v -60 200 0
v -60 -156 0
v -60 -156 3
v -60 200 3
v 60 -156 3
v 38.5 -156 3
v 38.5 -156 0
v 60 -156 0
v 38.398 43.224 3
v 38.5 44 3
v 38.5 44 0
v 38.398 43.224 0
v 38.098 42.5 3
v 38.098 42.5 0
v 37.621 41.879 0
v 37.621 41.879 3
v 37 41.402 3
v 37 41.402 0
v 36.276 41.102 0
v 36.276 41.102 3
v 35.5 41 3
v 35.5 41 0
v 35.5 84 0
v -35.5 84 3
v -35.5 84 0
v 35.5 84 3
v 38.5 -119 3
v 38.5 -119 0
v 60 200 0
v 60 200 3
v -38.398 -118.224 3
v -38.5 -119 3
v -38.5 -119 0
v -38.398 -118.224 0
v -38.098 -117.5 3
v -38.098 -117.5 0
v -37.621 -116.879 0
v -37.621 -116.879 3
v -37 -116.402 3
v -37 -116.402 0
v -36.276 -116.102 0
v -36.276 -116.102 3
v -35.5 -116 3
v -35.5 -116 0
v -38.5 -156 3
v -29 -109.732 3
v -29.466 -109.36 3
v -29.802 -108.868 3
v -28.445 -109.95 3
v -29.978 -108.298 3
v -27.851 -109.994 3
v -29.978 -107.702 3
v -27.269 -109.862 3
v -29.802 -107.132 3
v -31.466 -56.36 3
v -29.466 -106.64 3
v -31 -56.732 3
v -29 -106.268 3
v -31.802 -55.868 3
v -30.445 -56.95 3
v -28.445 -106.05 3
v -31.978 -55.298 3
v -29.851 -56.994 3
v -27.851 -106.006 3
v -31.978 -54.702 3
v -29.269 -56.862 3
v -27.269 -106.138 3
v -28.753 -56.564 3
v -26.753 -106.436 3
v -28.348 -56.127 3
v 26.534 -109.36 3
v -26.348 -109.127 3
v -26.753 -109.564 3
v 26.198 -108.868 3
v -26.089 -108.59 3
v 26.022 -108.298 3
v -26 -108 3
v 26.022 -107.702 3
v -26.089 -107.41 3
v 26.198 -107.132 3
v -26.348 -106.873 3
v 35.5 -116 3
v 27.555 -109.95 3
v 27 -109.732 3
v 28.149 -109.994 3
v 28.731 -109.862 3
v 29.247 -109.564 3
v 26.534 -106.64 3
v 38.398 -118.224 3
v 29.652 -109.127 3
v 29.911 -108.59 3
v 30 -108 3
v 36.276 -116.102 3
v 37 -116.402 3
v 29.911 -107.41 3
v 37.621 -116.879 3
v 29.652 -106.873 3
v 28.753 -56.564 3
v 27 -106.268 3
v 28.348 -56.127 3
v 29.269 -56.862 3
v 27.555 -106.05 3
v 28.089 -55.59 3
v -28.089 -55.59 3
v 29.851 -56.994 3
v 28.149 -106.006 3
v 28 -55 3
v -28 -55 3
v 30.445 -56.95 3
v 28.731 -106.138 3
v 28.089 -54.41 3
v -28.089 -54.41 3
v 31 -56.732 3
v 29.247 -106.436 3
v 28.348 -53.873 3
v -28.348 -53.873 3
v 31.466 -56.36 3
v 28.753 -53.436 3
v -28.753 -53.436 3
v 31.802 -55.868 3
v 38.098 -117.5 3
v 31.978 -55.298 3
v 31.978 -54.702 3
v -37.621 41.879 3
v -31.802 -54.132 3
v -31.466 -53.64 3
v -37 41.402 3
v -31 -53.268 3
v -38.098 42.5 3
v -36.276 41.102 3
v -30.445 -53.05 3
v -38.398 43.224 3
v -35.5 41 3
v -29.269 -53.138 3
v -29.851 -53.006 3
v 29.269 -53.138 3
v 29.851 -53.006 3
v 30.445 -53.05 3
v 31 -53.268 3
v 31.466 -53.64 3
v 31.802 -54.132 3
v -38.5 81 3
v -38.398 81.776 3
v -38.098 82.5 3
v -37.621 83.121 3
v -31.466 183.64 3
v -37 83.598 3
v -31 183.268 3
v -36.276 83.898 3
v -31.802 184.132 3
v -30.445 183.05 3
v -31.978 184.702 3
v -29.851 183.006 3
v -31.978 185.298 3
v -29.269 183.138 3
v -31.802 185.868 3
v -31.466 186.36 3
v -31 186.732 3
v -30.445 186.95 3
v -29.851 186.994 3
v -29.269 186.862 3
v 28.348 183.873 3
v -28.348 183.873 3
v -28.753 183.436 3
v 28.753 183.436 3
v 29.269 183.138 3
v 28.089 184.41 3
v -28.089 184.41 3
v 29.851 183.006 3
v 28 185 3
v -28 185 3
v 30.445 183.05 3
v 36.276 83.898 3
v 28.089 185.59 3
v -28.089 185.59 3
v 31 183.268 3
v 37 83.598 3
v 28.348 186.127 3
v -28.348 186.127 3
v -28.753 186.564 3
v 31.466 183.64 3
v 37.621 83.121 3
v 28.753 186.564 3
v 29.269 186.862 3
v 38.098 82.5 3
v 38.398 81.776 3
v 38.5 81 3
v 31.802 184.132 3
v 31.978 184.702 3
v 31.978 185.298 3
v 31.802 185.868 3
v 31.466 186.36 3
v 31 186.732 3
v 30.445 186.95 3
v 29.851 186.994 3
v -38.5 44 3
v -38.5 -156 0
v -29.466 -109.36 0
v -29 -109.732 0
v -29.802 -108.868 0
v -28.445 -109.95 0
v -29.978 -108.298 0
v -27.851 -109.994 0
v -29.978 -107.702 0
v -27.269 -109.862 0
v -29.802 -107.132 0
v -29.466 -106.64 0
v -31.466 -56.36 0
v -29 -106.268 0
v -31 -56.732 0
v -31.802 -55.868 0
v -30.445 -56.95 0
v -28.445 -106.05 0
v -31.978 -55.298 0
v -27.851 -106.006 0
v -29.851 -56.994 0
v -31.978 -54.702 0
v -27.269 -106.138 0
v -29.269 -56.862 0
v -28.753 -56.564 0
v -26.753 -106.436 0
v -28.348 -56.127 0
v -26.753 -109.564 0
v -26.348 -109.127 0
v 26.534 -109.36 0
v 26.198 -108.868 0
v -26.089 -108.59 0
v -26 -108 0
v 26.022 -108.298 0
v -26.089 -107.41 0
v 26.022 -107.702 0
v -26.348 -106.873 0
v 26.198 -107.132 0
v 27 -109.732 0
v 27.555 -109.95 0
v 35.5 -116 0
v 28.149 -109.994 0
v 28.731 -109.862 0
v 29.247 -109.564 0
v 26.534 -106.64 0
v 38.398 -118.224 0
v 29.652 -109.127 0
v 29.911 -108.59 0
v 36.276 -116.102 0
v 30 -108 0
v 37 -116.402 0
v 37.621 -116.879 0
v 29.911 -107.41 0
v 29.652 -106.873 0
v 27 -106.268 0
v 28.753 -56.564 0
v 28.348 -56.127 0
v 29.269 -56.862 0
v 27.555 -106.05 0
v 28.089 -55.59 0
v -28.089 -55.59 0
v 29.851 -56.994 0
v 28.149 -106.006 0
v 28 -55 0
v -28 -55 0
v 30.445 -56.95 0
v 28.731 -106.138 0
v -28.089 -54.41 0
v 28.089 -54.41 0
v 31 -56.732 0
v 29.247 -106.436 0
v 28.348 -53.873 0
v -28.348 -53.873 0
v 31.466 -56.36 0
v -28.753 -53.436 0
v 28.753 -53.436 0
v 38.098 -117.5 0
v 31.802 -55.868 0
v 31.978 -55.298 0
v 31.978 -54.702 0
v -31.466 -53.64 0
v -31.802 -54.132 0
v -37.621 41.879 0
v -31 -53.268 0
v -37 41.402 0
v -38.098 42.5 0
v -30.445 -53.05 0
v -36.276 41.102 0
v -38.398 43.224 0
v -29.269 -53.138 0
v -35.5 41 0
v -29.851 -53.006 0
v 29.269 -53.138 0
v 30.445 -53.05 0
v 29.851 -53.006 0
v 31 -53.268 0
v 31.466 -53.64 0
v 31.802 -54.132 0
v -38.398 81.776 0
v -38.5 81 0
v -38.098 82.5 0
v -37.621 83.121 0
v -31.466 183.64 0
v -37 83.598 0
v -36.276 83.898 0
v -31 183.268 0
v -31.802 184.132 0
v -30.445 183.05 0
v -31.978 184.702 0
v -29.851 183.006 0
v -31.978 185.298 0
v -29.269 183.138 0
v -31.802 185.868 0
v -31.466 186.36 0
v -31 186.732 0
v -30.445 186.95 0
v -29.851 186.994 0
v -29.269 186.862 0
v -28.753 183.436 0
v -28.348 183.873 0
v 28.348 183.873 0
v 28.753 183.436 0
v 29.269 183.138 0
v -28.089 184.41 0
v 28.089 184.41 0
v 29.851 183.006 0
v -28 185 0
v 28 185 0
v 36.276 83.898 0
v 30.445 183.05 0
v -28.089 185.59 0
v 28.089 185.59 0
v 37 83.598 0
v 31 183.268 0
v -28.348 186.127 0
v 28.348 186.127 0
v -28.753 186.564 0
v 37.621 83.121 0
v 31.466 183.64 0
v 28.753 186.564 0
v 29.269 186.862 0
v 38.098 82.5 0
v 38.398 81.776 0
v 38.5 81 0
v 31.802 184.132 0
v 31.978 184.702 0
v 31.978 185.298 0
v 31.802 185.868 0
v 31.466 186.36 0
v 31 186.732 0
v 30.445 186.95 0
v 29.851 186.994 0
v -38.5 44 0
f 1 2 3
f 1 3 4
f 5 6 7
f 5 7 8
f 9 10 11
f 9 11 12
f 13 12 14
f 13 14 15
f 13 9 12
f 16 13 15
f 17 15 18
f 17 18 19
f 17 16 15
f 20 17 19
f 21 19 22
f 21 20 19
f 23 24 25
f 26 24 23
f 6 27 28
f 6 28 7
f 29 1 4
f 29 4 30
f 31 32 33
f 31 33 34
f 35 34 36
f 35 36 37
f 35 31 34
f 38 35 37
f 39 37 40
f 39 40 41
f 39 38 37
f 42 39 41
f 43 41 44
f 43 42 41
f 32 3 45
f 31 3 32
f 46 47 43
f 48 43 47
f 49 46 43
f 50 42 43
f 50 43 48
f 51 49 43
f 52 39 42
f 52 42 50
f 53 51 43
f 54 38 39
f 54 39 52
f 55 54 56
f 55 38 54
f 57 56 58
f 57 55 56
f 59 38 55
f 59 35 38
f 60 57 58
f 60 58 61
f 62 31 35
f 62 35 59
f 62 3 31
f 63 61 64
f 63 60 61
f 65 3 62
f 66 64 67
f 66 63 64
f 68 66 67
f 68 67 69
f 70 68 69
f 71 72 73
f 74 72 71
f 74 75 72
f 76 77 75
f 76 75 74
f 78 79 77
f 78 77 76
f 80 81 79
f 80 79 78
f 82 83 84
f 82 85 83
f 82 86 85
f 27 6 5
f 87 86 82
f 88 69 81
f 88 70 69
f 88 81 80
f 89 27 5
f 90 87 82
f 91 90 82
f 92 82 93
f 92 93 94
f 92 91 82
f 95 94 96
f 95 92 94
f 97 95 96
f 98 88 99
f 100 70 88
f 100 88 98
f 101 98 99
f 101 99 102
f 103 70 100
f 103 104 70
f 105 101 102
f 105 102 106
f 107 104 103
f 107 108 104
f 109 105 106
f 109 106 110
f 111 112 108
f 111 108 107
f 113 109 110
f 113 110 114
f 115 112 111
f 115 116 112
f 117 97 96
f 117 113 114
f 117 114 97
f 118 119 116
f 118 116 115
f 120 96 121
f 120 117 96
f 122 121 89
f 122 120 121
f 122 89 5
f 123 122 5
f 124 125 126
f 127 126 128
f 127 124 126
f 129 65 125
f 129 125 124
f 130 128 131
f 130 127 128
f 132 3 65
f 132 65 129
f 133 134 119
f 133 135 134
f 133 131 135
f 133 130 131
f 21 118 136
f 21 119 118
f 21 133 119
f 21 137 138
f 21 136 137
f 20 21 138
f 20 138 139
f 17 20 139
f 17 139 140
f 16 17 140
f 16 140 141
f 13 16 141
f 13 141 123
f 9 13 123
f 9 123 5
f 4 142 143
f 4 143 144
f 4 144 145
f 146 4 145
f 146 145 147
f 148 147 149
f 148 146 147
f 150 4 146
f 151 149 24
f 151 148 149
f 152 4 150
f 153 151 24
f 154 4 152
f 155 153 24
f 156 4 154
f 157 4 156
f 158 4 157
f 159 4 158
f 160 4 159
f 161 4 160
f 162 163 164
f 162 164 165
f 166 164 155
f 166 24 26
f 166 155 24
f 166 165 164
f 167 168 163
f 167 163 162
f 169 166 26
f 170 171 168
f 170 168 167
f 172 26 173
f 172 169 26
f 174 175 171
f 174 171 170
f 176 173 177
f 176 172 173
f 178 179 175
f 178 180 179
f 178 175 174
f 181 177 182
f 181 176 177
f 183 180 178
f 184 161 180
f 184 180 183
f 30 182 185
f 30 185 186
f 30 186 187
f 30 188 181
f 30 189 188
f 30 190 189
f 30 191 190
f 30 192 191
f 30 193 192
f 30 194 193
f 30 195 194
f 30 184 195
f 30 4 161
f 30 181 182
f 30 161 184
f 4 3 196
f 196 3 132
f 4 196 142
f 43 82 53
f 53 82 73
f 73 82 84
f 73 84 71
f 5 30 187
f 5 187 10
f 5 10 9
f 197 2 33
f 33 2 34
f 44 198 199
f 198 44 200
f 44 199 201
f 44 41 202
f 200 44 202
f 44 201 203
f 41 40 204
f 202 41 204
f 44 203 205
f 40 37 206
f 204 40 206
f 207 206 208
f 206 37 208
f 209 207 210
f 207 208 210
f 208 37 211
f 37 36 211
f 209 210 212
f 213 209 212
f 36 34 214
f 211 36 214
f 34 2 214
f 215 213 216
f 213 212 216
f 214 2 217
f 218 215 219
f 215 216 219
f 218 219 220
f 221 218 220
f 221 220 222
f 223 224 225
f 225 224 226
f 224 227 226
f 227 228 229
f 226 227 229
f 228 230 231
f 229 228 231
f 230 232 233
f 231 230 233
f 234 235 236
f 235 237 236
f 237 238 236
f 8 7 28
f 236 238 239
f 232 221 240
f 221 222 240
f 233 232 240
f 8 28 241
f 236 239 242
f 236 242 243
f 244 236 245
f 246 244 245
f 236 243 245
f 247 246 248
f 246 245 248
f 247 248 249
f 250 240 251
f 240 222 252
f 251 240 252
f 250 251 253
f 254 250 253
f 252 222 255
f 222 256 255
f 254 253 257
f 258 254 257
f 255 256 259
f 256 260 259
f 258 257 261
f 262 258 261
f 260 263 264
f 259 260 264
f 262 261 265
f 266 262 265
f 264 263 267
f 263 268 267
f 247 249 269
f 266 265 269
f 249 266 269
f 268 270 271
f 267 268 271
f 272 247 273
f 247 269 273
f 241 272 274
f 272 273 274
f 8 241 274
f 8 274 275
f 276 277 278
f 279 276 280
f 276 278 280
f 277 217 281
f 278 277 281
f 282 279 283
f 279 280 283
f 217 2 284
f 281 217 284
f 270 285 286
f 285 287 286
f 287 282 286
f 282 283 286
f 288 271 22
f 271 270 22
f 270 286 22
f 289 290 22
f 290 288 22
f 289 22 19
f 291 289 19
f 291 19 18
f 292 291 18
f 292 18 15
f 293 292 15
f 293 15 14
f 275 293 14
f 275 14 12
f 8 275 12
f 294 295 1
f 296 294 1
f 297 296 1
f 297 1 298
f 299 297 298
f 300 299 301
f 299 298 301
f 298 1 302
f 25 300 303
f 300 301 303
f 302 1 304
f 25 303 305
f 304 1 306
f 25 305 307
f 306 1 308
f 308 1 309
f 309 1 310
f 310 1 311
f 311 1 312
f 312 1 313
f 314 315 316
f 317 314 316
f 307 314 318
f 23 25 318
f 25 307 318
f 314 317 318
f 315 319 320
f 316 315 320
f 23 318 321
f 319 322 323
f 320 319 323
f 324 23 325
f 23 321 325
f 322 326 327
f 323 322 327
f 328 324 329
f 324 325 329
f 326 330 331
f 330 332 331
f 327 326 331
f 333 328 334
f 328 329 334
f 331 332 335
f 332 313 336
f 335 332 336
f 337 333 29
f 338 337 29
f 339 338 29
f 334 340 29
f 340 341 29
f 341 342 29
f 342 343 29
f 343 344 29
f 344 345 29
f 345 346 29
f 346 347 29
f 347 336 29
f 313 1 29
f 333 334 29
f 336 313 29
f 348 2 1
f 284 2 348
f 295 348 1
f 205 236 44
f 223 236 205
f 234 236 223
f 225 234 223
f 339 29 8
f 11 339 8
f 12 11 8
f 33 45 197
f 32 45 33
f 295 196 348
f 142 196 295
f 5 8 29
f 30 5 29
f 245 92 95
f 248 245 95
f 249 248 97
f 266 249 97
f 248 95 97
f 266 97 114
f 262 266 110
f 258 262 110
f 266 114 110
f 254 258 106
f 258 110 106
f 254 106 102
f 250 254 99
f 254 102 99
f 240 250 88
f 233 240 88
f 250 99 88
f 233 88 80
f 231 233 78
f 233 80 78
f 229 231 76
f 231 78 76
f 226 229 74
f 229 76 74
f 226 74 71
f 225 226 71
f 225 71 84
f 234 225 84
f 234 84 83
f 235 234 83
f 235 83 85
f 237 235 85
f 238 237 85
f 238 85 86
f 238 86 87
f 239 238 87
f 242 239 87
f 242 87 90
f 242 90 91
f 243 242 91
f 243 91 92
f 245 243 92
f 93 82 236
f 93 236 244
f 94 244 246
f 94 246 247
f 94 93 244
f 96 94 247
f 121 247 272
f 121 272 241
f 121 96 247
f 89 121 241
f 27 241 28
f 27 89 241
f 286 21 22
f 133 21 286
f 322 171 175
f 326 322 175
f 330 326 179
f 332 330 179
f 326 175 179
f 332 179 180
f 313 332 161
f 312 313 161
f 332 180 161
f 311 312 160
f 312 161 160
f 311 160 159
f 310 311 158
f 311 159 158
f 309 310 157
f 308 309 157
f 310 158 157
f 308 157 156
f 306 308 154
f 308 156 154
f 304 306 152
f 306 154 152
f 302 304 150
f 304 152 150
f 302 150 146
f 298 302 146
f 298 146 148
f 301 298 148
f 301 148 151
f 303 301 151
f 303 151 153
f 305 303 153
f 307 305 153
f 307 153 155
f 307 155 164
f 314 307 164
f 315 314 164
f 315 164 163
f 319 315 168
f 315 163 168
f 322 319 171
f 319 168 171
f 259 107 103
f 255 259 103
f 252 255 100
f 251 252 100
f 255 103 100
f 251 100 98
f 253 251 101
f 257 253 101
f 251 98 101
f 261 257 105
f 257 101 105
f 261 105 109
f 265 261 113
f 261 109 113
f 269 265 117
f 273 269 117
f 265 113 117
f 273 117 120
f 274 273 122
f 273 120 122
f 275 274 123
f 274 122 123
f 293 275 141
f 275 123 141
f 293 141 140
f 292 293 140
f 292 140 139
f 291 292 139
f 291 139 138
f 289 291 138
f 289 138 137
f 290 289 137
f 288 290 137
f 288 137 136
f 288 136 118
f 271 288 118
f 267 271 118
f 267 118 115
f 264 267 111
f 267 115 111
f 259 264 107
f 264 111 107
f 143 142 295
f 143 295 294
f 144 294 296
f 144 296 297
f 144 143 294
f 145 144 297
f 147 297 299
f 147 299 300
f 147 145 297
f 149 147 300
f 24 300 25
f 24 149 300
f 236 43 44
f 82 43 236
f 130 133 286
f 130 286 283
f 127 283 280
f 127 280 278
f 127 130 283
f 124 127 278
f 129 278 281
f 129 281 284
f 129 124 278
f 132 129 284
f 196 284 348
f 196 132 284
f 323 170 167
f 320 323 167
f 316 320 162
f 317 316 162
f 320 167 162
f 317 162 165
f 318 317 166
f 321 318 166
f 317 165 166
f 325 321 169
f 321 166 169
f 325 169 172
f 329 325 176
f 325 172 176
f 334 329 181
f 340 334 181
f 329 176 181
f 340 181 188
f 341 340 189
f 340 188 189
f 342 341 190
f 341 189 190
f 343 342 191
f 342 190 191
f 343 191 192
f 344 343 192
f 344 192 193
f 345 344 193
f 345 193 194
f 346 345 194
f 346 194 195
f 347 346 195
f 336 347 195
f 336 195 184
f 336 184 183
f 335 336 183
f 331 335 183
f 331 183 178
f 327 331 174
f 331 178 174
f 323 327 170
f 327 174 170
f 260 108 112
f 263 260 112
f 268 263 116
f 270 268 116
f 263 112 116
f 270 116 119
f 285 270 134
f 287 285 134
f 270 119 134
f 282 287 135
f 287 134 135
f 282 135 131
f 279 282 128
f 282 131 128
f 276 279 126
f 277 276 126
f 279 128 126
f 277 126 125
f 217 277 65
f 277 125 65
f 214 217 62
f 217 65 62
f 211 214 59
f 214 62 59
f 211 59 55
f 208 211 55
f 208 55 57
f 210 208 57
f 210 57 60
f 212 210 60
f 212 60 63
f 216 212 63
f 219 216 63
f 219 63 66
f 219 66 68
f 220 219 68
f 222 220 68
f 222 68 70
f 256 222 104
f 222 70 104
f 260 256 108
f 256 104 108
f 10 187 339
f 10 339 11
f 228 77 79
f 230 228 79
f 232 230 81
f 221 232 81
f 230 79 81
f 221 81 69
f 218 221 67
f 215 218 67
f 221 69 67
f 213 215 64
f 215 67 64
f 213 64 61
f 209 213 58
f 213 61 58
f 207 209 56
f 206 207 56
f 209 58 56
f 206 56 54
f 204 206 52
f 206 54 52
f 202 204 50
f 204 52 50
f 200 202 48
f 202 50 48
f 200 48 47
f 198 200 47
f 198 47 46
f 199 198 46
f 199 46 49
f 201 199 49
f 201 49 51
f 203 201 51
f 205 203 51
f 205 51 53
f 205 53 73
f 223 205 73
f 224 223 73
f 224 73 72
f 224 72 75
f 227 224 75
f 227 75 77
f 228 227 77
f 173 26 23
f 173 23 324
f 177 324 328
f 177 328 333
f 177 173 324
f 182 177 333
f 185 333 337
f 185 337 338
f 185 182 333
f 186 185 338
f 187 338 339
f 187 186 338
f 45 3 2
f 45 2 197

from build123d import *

# Parameters (mm, degrees)
SKETCH1_W           = 120
SKETCH1_H           = 400
BOSS_EXTRUDE1_DEPTH = 3
CUT_EXTRUDE1_DEPTH  = 3
SKETCH3_R           = 2
CUT_EXTRUDE2_DEPTH  = 3
SKETCH4_W           = 120
SKETCH4_H           = 44
CUT_EXTRUDE3_DEPTH  = 10
SKETCH5_R           = 2
CUT_EXTRUDE4_DEPTH  = 10


with BuildPart() as part:
    # Sketch1 → Boss-Extrude1 (new body)
    with BuildSketch(Plane.XY):
        Rectangle(SKETCH1_W, SKETCH1_H)
    extrude(amount=BOSS_EXTRUDE1_DEPTH)

    # Sketch2 → Cut-Extrude1 (cut)
    with BuildSketch(Plane.XY.offset(3)):
        with BuildLine():
            Line((-35.5, -116), (35.5, -116))
            ThreePointArc((35.5, -116), (37.621320344, -116.878679656), (38.5, -119))
            Line((38.5, -119), (38.5, -156))
            ThreePointArc((38.5, -156), (37.621320344, -158.121320344), (35.5, -159))
            Line((35.5, -159), (-35.5, -159))
            ThreePointArc((-35.5, -159), (-37.621320344, -158.121320344), (-38.5, -156))
            Line((-38.5, -156), (-38.5, -119))
            ThreePointArc((-38.5, -119), (-37.621320344, -116.878679656), (-35.5, -116))
        make_face()
        with BuildLine():
            Line((-35.5, 84), (35.5, 84))
            ThreePointArc((35.5, 84), (37.621320344, 83.121320344), (38.5, 81))
            Line((38.5, 81), (38.5, 44))
            ThreePointArc((38.5, 44), (37.621320344, 41.878679656), (35.5, 41))
            Line((35.5, 41), (-35.5, 41))
            ThreePointArc((-35.5, 41), (-37.621320344, 41.878679656), (-38.5, 44))
            Line((-38.5, 44), (-38.5, 81))
            ThreePointArc((-38.5, 81), (-37.621320344, 83.121320344), (-35.5, 84))
        make_face()
    extrude(amount=-CUT_EXTRUDE1_DEPTH, mode=Mode.SUBTRACT)

    # Sketch3 → Cut-Extrude2 (cut)
    with BuildSketch(Plane.XY.offset(3)):
        with Locations((-30, 185)):
            Circle(SKETCH3_R)
        with Locations((-30, 65)):
            Circle(SKETCH3_R)
        with Locations((-30, -55)):
            Circle(SKETCH3_R)
        with Locations((-30, -175)):
            Circle(SKETCH3_R)
        with Locations(Location((30, -175, 0), (0, 0, 180))):
            Circle(SKETCH3_R)
        with Locations(Location((30, -55, 0), (0, 0, 180))):
            Circle(SKETCH3_R)
        with Locations((30, 65)):
            Circle(SKETCH3_R)
        with Locations(Location((30, 185, 0), (0, 0, 180))):
            Circle(SKETCH3_R)
    extrude(amount=-CUT_EXTRUDE2_DEPTH, mode=Mode.SUBTRACT)

    # Sketch4 → Cut-Extrude3 (cut)
    with BuildSketch(Plane.XY.offset(3)):
        with Locations((0, -178)):
            Rectangle(SKETCH4_W, SKETCH4_H)
    extrude(amount=-CUT_EXTRUDE3_DEPTH, mode=Mode.SUBTRACT)

    # Sketch5 → Cut-Extrude4 (cut)
    with BuildSketch(Plane.XY.offset(3)):
        with Locations((-28, -108)):
            Circle(SKETCH5_R)
        with Locations((28, -108)):
            Circle(SKETCH5_R)
    extrude(amount=-CUT_EXTRUDE4_DEPTH, mode=Mode.SUBTRACT)


solid = part.part
